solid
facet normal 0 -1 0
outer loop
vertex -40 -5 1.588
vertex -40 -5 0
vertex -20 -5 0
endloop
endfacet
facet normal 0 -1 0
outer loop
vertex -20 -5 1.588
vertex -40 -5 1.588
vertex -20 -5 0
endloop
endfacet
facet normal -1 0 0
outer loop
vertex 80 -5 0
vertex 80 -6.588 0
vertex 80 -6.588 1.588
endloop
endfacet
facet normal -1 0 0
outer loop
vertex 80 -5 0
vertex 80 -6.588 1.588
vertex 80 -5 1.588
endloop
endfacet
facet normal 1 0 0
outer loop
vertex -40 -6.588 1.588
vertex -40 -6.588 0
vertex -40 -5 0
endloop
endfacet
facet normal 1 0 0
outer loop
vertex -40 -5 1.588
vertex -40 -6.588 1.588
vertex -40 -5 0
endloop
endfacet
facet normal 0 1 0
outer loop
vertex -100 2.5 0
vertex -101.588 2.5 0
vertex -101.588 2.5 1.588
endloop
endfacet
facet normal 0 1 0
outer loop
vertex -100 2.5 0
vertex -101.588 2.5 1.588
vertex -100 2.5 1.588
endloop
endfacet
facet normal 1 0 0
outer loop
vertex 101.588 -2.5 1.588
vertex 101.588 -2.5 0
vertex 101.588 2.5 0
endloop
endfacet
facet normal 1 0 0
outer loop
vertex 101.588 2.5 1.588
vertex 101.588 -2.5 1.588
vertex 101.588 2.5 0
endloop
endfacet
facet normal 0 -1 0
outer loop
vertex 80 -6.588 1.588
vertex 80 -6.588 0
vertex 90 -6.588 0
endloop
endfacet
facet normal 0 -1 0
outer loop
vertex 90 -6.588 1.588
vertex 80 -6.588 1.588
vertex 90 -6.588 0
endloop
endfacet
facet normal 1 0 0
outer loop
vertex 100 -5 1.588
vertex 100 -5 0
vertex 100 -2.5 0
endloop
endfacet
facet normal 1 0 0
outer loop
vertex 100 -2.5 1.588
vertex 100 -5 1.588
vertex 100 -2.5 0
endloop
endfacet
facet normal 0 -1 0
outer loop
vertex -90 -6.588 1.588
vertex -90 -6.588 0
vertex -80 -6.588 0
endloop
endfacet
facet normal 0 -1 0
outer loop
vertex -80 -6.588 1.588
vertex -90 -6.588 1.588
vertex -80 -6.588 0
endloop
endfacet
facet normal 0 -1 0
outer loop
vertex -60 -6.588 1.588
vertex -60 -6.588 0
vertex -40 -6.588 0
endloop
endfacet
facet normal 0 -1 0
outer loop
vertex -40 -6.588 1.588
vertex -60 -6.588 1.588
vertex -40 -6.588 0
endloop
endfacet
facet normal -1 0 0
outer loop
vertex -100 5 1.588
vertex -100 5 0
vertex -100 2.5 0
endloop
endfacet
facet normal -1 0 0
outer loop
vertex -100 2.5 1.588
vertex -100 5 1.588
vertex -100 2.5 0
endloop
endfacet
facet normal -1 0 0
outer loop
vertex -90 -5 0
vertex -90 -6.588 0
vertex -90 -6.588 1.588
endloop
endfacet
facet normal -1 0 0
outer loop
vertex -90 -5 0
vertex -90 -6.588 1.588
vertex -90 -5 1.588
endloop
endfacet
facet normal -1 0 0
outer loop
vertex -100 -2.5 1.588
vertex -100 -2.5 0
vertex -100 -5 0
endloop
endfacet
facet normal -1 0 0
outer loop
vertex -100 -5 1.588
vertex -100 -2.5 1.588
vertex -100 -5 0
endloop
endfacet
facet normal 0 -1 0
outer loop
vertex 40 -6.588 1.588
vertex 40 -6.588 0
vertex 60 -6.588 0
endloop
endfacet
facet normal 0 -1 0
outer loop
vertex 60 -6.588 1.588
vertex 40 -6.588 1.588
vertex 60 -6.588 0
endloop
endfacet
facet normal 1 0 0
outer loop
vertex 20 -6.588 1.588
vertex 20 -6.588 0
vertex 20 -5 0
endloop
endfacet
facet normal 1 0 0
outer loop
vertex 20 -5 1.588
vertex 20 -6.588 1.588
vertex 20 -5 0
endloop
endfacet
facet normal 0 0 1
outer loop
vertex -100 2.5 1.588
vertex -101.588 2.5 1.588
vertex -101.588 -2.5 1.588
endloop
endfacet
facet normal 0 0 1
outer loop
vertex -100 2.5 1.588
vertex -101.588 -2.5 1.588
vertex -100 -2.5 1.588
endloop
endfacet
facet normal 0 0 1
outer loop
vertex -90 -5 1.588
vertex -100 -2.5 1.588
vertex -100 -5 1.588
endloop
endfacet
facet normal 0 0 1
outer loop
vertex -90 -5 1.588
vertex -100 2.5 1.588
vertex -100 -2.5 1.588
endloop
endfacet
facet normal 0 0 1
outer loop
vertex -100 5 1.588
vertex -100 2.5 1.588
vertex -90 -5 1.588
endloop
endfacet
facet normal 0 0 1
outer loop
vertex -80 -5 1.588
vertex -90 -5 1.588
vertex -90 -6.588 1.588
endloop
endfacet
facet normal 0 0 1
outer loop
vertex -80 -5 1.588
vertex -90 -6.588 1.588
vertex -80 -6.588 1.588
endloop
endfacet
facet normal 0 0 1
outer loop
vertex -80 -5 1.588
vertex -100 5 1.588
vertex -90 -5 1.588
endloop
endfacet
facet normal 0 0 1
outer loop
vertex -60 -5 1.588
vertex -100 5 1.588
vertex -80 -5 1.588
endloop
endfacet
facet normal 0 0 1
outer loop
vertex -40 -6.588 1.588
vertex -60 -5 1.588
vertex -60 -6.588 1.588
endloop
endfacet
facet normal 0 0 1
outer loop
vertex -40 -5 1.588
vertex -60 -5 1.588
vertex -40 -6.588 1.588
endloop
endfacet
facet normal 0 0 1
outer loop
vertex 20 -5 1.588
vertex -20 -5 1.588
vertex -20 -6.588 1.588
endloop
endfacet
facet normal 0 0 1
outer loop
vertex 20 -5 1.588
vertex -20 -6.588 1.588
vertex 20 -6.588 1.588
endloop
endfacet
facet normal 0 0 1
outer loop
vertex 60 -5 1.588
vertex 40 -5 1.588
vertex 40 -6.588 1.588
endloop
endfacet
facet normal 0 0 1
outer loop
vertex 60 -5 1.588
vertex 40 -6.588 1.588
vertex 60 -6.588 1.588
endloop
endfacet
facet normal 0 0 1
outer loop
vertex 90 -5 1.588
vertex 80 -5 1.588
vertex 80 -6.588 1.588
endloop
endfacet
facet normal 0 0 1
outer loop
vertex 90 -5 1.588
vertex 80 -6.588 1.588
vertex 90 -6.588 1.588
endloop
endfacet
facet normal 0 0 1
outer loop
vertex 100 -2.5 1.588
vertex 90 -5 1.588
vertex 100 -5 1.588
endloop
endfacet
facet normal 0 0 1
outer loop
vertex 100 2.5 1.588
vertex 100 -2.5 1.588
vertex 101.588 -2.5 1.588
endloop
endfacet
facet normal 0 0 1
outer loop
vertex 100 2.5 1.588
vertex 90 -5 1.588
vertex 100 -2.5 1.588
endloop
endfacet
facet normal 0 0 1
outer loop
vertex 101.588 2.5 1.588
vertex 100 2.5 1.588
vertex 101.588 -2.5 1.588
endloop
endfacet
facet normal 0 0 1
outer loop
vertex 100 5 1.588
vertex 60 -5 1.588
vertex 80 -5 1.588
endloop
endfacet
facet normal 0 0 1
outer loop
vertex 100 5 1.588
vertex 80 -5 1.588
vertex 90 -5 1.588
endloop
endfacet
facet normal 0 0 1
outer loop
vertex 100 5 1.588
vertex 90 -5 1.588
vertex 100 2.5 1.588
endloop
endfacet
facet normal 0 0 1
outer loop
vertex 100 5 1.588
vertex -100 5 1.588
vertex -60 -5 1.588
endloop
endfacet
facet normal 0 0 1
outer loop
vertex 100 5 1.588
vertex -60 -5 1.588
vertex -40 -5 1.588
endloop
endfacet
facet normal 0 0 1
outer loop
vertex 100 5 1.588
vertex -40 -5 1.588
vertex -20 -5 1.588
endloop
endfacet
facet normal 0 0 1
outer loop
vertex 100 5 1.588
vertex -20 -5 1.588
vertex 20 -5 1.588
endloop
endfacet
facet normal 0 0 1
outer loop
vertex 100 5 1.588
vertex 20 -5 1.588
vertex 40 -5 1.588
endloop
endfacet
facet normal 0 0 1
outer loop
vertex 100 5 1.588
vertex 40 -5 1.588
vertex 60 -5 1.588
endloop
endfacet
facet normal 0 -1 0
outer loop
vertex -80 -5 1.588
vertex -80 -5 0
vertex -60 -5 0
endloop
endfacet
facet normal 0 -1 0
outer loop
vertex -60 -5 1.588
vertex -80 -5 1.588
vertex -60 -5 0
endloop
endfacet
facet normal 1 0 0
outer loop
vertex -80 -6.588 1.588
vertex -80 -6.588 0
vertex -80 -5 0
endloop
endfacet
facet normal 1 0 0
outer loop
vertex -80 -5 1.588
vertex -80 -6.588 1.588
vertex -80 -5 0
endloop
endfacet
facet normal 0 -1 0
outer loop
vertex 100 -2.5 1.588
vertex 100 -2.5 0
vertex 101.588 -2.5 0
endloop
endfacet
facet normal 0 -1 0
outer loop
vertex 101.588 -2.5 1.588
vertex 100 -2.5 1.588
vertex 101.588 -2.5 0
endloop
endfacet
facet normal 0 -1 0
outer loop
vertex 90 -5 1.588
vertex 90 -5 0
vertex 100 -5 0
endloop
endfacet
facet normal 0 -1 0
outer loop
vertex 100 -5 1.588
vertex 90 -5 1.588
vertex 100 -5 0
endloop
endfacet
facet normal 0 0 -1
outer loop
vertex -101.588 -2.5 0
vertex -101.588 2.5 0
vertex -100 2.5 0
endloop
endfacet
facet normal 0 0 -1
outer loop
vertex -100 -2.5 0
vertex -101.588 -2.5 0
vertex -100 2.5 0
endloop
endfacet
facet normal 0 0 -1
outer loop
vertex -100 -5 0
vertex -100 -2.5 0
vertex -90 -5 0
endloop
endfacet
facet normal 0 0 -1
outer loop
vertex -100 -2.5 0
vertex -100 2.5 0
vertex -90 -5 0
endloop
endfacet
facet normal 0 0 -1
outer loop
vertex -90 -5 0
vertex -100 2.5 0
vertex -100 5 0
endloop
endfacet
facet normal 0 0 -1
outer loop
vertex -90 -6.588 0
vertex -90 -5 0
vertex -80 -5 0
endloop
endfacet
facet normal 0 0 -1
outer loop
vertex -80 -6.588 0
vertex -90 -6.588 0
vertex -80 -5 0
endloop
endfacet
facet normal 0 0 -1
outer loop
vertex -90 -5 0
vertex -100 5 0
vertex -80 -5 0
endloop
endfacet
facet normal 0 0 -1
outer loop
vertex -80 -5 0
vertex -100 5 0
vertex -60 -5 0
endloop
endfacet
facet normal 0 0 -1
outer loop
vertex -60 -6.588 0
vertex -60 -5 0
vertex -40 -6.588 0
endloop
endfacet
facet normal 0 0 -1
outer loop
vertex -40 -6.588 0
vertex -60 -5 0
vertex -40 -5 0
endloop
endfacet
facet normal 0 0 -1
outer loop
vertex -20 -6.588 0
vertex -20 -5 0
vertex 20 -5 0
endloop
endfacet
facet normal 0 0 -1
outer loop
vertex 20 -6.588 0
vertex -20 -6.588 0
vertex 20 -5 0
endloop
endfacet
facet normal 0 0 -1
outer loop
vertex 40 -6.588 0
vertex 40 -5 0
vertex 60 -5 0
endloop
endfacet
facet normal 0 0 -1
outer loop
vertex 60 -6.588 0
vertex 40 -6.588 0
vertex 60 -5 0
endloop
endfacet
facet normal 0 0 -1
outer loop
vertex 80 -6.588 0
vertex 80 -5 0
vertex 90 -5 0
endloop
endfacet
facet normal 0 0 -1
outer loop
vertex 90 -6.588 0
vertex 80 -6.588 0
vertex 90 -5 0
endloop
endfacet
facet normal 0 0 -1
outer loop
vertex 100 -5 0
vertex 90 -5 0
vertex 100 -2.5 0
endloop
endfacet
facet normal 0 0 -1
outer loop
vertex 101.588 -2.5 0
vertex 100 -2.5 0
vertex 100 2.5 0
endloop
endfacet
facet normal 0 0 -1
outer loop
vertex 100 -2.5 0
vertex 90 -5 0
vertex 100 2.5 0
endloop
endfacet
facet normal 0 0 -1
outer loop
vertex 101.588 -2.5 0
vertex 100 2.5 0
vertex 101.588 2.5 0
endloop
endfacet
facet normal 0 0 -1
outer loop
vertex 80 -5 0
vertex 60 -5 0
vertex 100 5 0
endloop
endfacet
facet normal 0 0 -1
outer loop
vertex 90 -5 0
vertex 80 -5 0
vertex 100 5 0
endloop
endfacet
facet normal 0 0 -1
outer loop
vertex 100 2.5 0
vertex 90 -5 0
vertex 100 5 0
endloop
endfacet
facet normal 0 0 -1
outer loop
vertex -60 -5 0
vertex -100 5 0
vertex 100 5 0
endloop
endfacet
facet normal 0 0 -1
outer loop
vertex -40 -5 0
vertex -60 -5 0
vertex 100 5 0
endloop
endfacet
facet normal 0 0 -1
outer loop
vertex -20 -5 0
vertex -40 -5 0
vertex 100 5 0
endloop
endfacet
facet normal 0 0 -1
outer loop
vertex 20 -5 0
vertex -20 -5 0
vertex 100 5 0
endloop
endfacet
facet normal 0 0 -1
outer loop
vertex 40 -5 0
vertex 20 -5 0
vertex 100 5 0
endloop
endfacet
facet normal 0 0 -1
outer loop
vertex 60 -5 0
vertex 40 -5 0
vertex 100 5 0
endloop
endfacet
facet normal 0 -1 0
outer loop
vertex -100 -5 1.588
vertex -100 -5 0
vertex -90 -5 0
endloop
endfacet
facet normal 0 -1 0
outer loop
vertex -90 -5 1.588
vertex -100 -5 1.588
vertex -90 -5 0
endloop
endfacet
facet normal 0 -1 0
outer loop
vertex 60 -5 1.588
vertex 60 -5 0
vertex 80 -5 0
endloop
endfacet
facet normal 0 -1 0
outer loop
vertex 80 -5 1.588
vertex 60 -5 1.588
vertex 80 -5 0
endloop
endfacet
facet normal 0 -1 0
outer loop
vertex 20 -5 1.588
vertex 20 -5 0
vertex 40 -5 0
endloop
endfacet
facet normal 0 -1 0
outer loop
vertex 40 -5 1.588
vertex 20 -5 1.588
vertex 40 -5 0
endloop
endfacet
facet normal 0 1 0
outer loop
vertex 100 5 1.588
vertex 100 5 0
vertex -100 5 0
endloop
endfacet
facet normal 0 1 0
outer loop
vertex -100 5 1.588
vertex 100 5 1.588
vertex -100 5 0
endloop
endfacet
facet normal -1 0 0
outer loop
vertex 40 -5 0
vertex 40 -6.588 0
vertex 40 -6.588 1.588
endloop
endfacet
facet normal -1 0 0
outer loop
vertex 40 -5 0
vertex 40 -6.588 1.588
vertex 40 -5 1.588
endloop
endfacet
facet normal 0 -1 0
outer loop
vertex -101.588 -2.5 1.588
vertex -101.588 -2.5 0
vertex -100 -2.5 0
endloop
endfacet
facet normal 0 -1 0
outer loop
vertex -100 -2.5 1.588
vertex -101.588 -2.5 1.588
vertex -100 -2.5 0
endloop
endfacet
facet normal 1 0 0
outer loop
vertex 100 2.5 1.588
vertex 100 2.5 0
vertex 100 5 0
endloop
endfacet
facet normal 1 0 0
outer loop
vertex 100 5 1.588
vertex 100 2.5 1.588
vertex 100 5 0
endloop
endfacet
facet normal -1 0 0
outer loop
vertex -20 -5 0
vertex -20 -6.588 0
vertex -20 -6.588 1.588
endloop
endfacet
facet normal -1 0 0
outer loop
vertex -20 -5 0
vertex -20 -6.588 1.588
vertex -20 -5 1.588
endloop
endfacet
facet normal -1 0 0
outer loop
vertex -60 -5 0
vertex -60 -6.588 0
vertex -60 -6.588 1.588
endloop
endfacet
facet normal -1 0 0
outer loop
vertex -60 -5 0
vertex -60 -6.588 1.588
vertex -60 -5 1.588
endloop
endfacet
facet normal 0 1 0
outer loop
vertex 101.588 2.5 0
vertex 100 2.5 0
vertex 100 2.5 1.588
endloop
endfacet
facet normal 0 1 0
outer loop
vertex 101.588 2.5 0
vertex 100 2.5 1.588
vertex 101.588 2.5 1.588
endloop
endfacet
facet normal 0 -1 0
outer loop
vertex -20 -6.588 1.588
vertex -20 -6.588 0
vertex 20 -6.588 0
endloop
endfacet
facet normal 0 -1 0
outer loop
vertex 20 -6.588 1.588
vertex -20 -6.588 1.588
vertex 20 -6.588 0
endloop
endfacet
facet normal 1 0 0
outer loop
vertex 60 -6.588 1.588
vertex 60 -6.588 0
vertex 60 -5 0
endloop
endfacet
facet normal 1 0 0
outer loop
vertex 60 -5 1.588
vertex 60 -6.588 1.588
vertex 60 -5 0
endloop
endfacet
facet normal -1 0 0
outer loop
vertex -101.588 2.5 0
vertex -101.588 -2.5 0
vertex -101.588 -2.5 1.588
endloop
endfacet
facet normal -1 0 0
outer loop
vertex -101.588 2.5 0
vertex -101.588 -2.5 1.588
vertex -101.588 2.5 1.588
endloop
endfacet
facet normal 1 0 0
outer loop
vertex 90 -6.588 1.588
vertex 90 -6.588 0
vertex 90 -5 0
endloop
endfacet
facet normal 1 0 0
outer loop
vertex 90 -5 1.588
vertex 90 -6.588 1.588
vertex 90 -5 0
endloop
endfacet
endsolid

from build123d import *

# Parameters (mm, degrees)
F0_W     = 10
F0_H     = 1.5875
F0_W_2   = 1.5875
F0_H_2   = 5
F0_W_3   = 20
F0_W_4   = 40
F1_DEPTH = 1.5875


# Not quite as in the source:
# - a length typed as a fraction of an inch, garbled in the dataset ("3 / 203.2 mm" for 3/8 in), is restored


with BuildPart() as f1:
    # F0 (on Top) → F1 (new body)
    with BuildSketch(Plane.XY):
        Polygon((-100, -2.5), (-100, -5), (-90, -5), (-80, -5), (-60, -5), (-40, -5), (-20, -5), (20, -5), (40, -5), (60, -5), (80, -5), (90, -5), (100, -5), (100, -2.5), (100, 2.5), (100, 5), (-100, 5), (-100, 2.5), align=None)
        with Locations((-85, -5.79375)):
            Rectangle(F0_W, F0_H)
        with Locations((-100.79375, 0)):
            Rectangle(F0_W_2, F0_H_2)
        with Locations((-50, -5.79375)):
            Rectangle(F0_W_3, F0_H)
        with Locations((0, -5.79375)):
            Rectangle(F0_W_4, F0_H)
        with Locations((100.79375, 0)):
            Rectangle(F0_W_2, F0_H_2)
        with Locations((50, -5.79375)):
            Rectangle(F0_W_3, F0_H)
        with Locations((85, -5.79375)):
            Rectangle(F0_W, F0_H)
    extrude(amount=F1_DEPTH)


solid = f1.part
